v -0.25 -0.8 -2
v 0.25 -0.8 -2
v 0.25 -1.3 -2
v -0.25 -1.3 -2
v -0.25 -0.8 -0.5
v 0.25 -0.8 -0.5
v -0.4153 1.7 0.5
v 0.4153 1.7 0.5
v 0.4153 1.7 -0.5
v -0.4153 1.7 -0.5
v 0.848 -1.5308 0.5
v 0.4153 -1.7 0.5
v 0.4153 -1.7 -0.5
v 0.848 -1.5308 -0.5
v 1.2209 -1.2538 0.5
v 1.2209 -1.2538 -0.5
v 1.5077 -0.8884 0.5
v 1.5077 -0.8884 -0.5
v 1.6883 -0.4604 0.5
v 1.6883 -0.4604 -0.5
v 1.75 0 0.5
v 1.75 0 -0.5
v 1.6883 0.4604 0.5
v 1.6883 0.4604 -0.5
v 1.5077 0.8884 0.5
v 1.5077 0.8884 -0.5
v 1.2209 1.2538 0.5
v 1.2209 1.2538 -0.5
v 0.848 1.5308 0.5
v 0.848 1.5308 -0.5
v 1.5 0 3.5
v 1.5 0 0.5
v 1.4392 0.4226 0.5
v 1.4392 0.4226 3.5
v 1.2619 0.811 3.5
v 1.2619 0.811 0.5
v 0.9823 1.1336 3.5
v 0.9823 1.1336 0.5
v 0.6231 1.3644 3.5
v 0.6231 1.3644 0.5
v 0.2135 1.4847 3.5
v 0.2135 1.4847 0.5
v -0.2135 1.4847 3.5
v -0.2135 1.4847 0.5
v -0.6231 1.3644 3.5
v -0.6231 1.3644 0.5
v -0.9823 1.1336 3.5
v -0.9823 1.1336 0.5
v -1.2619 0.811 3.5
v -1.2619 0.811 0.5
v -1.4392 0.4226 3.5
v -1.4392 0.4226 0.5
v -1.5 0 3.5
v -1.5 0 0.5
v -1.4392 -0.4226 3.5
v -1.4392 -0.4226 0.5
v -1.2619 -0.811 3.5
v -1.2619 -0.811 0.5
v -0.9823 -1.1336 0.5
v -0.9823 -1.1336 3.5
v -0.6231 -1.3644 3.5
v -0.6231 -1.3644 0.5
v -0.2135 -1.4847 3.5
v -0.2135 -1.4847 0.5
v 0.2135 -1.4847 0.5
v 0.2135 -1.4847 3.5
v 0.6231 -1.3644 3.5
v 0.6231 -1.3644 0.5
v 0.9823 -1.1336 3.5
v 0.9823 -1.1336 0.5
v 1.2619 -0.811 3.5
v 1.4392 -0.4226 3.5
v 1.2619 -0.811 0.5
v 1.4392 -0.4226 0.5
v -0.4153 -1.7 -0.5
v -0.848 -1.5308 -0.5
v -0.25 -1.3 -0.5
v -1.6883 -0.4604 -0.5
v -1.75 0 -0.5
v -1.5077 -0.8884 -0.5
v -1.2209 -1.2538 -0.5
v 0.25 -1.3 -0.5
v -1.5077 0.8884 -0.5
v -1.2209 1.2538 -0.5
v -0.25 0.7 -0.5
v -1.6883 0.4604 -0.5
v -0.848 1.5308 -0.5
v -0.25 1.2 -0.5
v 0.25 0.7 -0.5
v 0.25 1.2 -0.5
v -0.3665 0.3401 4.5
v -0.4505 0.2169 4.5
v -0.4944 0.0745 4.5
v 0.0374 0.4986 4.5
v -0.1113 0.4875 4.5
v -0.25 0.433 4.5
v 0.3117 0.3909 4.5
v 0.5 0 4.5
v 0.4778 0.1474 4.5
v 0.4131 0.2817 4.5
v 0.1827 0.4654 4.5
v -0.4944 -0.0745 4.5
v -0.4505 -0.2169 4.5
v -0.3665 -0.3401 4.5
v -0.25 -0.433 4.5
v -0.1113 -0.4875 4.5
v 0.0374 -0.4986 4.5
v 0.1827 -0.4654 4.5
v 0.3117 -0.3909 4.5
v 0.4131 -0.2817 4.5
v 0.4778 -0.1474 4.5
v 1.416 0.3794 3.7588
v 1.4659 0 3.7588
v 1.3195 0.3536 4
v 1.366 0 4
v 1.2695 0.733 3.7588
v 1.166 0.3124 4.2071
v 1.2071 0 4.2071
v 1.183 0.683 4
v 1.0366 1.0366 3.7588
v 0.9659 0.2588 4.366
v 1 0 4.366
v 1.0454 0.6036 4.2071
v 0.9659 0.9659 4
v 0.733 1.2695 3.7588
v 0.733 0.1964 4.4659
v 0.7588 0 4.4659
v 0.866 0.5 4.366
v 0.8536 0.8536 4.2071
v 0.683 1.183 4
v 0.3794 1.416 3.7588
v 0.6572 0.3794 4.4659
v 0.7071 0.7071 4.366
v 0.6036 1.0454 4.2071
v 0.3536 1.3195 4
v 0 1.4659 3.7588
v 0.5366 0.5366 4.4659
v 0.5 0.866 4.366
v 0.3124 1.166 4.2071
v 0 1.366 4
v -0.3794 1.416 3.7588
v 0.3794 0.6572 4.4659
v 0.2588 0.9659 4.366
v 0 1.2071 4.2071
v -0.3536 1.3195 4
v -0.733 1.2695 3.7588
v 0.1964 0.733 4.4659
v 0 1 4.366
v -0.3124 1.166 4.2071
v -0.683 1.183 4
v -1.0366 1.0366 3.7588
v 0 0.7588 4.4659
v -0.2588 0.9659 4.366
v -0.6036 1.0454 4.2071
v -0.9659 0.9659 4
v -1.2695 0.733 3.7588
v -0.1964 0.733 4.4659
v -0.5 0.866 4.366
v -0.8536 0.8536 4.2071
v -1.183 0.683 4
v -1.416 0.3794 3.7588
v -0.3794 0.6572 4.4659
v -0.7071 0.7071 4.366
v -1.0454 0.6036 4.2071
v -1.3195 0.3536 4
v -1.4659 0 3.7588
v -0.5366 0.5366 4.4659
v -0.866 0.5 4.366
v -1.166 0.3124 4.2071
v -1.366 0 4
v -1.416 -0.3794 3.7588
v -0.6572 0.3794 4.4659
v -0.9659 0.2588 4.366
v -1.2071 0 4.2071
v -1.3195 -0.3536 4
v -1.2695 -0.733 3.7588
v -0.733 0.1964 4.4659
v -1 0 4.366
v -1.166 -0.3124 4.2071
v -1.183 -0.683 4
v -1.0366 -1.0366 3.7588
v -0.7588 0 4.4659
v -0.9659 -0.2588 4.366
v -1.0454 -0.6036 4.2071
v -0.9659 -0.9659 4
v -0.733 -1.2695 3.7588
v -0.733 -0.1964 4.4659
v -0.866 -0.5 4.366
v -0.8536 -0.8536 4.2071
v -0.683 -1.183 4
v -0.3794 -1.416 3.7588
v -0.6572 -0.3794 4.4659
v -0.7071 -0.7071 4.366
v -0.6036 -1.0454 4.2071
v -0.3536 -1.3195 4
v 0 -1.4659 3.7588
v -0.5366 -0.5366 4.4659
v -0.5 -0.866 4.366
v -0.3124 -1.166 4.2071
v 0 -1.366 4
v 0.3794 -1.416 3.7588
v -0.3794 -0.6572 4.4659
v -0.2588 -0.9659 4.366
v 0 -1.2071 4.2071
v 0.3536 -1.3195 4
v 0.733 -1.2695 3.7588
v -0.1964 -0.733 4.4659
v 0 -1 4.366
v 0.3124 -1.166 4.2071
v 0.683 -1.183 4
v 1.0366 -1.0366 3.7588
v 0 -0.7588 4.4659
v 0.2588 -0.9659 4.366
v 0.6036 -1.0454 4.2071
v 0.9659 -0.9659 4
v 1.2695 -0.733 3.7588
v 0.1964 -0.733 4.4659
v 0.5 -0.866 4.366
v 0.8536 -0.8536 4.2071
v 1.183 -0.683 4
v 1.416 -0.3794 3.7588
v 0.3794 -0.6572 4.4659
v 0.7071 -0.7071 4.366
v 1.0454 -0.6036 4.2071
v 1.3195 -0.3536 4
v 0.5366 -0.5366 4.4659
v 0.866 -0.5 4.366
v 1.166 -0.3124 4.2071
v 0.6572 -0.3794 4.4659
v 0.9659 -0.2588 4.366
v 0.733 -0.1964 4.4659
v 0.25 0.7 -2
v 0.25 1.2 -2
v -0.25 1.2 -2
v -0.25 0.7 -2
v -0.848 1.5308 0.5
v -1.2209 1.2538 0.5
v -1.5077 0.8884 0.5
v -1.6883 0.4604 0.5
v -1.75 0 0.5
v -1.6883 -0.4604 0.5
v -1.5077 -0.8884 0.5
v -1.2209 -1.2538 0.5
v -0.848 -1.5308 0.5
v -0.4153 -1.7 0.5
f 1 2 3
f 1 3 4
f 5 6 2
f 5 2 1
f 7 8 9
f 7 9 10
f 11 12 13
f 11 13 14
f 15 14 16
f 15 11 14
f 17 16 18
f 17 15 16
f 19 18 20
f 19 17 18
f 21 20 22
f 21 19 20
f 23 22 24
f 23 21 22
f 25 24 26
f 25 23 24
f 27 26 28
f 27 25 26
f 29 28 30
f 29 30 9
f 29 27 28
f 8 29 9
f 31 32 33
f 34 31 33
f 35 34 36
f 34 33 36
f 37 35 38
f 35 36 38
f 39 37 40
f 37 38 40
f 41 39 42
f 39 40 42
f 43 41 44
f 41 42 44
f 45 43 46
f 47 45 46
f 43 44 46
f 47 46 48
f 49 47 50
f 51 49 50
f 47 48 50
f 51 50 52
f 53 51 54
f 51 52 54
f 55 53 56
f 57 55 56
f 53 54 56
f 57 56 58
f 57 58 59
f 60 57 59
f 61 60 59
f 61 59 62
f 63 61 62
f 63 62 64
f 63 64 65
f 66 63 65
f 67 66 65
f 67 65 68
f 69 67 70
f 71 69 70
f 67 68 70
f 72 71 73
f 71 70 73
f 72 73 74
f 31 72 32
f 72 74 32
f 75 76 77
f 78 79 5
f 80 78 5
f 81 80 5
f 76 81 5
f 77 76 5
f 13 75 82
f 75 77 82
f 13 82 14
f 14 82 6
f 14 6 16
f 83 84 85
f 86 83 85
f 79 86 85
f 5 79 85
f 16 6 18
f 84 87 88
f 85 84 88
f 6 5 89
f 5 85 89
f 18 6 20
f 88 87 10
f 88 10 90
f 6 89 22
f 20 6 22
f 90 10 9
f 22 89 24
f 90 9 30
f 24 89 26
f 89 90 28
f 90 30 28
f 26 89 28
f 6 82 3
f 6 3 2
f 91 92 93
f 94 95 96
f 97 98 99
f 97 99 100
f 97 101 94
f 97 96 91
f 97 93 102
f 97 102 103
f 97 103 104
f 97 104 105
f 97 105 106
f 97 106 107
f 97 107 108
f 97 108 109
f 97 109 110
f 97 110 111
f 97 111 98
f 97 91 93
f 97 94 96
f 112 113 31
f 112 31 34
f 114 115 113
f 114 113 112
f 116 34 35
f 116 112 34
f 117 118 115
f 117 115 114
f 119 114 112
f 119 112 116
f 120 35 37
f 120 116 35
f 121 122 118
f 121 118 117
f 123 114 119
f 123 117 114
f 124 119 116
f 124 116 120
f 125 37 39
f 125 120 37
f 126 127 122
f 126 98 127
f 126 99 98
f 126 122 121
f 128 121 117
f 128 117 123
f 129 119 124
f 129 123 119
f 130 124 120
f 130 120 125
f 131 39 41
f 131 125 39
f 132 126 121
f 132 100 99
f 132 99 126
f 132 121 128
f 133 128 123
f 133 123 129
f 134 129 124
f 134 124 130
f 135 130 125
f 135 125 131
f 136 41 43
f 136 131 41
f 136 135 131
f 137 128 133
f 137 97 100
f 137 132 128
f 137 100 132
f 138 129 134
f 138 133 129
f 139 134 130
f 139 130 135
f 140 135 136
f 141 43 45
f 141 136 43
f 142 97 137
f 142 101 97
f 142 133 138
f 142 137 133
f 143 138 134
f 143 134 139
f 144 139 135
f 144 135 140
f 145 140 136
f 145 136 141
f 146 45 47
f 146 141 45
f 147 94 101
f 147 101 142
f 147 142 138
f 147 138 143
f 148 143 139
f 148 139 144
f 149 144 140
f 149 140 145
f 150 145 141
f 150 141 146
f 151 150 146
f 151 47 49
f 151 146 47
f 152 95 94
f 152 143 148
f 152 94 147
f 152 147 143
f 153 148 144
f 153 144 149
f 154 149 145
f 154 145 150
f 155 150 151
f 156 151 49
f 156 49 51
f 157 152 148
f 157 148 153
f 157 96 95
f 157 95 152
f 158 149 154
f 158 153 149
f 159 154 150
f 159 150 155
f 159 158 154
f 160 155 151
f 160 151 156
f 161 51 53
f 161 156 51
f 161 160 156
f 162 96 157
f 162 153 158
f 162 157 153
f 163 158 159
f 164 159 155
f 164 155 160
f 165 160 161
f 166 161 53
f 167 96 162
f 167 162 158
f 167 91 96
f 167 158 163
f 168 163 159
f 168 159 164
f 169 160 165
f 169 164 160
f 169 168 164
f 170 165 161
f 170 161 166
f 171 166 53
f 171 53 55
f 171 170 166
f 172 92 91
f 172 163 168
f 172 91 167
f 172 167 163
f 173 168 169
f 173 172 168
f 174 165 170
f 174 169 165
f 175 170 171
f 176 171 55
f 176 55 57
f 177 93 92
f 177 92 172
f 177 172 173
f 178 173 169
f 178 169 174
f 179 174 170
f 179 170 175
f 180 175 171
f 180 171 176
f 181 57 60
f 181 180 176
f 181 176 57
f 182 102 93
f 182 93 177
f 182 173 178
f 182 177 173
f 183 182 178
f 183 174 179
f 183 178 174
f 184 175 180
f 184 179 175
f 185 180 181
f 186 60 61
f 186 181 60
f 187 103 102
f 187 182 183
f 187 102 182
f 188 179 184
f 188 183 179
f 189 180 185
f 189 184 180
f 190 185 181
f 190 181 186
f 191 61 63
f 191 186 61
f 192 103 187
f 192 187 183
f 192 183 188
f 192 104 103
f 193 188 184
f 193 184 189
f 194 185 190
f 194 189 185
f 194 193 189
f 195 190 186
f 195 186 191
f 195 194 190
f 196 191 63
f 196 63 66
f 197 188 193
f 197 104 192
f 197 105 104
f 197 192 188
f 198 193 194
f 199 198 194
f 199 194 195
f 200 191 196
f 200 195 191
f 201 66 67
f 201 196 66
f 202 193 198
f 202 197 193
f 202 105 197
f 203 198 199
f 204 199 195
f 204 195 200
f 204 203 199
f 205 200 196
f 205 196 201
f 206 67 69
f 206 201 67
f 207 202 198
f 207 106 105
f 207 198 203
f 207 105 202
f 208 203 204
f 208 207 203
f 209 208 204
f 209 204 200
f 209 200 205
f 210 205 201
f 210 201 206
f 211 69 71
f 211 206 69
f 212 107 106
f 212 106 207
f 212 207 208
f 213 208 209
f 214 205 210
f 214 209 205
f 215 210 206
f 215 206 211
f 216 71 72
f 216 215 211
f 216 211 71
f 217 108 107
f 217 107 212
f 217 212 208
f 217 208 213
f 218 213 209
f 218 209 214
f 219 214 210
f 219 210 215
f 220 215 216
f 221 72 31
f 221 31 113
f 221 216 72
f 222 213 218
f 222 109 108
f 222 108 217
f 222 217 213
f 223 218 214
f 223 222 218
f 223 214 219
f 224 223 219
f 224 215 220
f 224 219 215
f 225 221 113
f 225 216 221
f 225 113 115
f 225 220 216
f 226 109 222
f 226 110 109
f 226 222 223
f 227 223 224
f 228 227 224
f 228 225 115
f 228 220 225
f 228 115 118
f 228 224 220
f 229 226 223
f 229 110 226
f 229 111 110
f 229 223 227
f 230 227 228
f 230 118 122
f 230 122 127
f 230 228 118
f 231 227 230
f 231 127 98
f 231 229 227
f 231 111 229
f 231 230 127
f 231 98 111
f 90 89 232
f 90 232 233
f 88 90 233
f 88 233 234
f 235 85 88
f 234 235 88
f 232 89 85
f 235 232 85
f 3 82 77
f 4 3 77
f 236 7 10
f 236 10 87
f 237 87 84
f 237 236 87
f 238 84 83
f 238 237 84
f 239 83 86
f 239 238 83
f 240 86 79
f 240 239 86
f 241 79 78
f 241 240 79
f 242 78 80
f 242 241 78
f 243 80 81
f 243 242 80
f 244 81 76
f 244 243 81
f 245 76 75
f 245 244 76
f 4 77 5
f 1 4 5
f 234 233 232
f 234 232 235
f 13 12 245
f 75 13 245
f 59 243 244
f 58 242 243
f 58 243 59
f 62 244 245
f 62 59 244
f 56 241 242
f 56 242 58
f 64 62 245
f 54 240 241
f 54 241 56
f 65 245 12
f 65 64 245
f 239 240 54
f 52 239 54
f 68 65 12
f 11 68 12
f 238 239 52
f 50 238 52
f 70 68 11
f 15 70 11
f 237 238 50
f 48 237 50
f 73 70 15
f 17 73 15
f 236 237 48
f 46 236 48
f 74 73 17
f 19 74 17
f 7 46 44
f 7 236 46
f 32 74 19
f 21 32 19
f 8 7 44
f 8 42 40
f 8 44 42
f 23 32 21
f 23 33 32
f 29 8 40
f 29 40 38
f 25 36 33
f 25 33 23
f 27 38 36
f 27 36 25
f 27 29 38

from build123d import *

# Parameters (mm, degrees)
SKETCH1_R      = 1.75
EXTRUDE1_DEPTH = 0.5
SKETCH2_R      = 1.5
EXTRUDE2_DEPTH = 4
FILLET2_R      = 1
SKETCH4_W      = 13.081078865
SKETCH4_H      = 5.810496129
EXTRUDE3_DEPTH = 1.3
SKETCH5_W      = 0.5
SKETCH5_H      = 0.5
EXTRUDE4_DEPTH = 1.5


with BuildPart() as part:
    # Sketch1 → Extrude1 (new, symmetric)
    with BuildSketch(Plane.XY):
        Circle(SKETCH1_R)
    extrude(amount=EXTRUDE1_DEPTH, both=True)

    # Sketch2 → Extrude2 (add)
    with BuildSketch(Plane.XY.offset(0.5)):
        Circle(SKETCH2_R)
    extrude(amount=EXTRUDE2_DEPTH)

    # Fillet2
    fillet2_edges = [part.edges().sort_by_distance(p)[0] for p in [
        (-1.5, 0, 4.5),
    ]]
    fillet(fillet2_edges, radius=FILLET2_R)

    # Sketch4 → Extrude3 (cut)
    with BuildSketch(Plane(origin=(0, 3, 0), x_dir=(-1, 0, 0), z_dir=(0, 1, 0))):
        with Locations((-1.941605697, 0.17278636)):
            Rectangle(SKETCH4_W, SKETCH4_H)
    extrude3 = extrude(amount=-EXTRUDE3_DEPTH, mode=Mode.SUBTRACT)

    # Sketch5 → Extrude4 (add)
    with BuildSketch(Plane(origin=(0, 0, -0.5), x_dir=(-1, 0, 0), z_dir=(0, 0, -1))):
        with Locations((0, 0.95)):
            Rectangle(SKETCH5_W, SKETCH5_H)
        with Locations((0, -1.05)):
            Rectangle(SKETCH5_W, SKETCH5_H)
    extrude(amount=EXTRUDE4_DEPTH)

    # Simetría1: Extrude3 across plane
    add(extrude3.mirror(Plane.ZX), mode=Mode.SUBTRACT)


solid = part.part
